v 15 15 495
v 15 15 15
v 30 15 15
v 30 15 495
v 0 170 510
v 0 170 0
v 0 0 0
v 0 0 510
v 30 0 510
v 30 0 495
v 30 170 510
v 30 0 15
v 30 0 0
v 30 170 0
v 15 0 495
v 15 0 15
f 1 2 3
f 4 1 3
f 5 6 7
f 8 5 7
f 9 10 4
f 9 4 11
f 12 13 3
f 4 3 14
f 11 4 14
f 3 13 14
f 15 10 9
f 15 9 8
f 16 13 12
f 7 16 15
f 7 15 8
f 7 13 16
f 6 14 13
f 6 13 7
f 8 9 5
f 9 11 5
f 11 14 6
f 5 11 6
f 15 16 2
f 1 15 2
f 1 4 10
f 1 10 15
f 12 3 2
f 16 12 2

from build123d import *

# Parameters (mm, degrees)
EXTRUDE_1_DEPTH        = 510
SKETCH_2_W             = 15
SKETCH_2_H             = 15
EXTRUDE_2_DEPTH        = 15
PATTERN_LINEAR_1_COUNT = 2
PATTERN_LINEAR_1_PITCH = 495


with BuildPart() as part:
    # Эскиз1 → Бобышка-Вытянуть1 (new body)
    with BuildSketch(Plane.XY):
        Polygon((0, 0), (15, 0), (15, 15), (30, 15), (30, 170), (0, 170), align=None)
    extrude(amount=EXTRUDE_1_DEPTH)

    # Эскиз2 → Бобышка-Вытянуть2 (add)
    with BuildSketch(Plane(origin=(0, 0, 0), x_dir=(-1, 0, 0), z_dir=(0, 0, -1))):
        with Locations((-22.5, 7.5)):
            Rectangle(SKETCH_2_W, SKETCH_2_H)
    extrude_2 = extrude(amount=-EXTRUDE_2_DEPTH)

    # Линейный массив1: Бобышка-Вытянуть2 ×2
    with Locations(*[(0, 0, i * PATTERN_LINEAR_1_PITCH) for i in range(1, PATTERN_LINEAR_1_COUNT)]):
        add(extrude_2)


solid = part.part
